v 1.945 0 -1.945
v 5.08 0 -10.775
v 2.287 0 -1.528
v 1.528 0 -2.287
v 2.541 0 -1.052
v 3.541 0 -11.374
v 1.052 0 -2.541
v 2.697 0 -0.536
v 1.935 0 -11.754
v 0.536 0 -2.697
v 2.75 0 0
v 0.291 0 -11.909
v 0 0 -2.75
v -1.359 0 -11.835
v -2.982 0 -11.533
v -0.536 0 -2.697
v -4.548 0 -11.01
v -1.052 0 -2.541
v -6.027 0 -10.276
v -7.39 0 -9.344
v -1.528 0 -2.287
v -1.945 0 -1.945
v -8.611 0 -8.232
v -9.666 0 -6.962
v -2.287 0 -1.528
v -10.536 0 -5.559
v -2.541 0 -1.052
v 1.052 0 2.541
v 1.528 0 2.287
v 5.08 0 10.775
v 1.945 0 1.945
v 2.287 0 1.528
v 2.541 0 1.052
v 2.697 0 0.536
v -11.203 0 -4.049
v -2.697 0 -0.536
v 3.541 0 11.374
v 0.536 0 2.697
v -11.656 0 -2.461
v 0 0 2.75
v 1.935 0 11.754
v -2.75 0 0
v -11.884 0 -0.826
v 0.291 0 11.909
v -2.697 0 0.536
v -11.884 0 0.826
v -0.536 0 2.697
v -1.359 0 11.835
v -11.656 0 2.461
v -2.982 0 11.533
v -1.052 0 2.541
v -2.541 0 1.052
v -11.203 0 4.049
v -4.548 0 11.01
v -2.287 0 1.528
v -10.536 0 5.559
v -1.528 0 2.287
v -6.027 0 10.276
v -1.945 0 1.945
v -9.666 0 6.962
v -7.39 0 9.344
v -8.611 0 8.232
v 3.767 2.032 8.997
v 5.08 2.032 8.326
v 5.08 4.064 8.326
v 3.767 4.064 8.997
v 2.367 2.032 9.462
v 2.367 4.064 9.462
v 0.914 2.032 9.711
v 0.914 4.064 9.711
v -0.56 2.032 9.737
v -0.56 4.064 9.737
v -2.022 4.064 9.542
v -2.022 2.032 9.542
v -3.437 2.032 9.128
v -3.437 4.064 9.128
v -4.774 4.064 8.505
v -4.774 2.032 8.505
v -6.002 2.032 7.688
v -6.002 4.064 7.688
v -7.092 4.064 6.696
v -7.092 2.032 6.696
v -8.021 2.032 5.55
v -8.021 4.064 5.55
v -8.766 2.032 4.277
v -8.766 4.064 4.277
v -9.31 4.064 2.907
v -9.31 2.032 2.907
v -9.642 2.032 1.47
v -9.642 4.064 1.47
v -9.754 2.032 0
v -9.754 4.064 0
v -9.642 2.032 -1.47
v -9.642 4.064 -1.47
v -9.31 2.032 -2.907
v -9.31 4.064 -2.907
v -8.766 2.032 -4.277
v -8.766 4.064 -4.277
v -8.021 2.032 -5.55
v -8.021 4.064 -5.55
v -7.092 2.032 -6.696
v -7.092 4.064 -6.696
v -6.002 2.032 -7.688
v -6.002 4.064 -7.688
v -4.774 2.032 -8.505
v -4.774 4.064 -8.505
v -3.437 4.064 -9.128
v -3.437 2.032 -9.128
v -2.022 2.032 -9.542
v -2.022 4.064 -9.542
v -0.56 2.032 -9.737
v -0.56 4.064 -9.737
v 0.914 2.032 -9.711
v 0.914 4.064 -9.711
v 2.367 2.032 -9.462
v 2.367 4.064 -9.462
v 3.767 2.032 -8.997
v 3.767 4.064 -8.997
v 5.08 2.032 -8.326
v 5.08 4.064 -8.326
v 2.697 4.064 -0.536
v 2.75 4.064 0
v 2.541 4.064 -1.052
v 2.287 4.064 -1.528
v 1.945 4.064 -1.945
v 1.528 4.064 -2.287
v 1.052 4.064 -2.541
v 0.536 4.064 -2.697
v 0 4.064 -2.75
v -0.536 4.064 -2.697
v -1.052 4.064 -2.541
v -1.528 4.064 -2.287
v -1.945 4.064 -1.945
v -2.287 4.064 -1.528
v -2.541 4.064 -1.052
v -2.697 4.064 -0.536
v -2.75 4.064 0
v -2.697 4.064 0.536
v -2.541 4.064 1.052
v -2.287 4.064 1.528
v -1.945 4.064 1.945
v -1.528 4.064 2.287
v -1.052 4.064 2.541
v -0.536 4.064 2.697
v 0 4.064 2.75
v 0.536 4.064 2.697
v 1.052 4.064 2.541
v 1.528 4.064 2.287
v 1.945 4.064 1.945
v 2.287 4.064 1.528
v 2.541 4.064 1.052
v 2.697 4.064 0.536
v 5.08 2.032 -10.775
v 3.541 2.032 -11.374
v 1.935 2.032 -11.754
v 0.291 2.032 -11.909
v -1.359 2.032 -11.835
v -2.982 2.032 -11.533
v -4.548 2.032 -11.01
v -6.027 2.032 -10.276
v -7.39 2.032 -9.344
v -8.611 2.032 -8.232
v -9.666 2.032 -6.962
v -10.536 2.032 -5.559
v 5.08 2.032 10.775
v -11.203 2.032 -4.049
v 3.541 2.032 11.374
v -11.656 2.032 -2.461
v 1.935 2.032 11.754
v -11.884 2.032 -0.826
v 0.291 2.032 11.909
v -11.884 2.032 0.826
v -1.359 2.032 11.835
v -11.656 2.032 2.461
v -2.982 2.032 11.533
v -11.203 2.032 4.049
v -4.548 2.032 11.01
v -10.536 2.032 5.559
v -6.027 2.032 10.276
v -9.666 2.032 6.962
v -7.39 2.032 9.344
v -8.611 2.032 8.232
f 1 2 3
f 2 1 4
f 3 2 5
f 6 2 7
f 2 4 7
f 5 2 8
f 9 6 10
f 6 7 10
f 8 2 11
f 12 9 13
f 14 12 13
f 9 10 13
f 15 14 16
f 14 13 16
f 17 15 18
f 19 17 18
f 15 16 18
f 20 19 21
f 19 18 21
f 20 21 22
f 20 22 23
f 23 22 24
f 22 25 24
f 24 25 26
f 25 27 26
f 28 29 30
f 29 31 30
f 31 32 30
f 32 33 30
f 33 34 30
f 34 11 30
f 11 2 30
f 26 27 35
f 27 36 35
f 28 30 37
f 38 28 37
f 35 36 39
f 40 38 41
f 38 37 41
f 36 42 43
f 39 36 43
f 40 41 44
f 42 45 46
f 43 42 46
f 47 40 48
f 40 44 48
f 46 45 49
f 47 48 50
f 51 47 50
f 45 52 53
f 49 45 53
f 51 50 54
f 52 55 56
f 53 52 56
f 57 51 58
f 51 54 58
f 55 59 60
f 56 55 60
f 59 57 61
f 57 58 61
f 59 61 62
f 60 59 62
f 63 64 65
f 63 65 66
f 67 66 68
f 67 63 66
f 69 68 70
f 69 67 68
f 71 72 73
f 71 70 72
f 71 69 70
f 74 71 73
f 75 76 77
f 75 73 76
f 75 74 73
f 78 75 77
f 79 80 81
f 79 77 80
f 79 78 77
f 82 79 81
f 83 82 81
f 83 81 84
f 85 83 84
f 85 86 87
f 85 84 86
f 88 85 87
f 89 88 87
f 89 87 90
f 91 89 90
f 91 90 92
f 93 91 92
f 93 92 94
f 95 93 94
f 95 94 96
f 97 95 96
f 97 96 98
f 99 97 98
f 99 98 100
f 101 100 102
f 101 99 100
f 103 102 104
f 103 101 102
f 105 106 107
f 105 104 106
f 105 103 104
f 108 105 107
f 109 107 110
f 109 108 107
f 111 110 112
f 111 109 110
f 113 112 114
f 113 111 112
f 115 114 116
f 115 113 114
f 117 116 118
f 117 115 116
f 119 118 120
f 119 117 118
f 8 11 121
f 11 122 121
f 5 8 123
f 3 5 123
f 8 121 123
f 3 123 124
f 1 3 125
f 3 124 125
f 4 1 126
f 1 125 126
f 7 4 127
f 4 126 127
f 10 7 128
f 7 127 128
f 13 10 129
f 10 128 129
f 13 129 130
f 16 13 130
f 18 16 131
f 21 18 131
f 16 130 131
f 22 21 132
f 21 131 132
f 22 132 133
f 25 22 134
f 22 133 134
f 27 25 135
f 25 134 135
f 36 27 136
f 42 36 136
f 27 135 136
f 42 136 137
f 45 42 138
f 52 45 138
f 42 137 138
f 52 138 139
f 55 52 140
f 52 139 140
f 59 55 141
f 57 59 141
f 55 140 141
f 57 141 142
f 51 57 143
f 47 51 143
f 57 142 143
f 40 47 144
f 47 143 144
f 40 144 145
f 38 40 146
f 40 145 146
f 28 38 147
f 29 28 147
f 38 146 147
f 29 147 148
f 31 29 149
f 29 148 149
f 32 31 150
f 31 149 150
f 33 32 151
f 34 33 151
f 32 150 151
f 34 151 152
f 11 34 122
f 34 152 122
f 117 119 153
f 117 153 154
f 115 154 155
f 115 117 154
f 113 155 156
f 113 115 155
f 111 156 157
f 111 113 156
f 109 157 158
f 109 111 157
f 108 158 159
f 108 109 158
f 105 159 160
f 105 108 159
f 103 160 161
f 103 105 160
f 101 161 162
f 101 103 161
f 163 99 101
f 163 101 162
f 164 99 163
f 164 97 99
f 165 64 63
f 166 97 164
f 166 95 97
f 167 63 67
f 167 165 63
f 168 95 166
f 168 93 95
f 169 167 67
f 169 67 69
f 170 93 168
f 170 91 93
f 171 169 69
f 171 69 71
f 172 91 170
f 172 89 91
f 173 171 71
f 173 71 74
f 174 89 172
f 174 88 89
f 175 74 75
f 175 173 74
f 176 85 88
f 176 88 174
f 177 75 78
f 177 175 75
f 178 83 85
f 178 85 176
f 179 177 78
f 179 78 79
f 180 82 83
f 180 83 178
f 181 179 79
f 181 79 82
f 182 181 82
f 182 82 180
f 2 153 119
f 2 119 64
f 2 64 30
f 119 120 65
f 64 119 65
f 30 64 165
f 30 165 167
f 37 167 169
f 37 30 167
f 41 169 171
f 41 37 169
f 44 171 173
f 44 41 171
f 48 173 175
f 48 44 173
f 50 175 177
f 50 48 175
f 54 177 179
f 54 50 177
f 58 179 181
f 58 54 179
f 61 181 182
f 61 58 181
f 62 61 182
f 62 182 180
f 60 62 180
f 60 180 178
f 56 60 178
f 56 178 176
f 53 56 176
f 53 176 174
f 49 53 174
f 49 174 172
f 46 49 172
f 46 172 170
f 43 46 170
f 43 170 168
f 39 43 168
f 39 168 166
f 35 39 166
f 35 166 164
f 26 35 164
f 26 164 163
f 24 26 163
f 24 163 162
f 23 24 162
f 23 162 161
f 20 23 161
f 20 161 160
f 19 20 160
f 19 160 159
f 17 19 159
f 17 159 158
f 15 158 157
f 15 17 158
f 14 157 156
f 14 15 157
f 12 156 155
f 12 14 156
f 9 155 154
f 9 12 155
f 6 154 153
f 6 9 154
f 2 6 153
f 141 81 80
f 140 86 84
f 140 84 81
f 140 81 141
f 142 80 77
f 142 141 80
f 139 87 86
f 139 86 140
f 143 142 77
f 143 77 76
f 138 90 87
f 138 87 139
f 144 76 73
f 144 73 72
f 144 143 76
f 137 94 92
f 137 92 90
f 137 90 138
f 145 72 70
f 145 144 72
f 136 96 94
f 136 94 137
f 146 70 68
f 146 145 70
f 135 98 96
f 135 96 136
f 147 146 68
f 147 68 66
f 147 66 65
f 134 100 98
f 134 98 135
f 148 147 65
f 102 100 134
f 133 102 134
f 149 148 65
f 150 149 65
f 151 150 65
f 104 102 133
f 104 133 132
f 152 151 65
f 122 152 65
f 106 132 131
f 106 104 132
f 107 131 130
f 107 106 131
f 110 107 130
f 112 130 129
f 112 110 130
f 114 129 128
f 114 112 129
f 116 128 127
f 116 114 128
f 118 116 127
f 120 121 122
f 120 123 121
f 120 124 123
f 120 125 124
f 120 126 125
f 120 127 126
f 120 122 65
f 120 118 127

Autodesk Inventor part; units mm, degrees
ref_plane "YZ Plane" through (0, 0, 0) normal (1, 0, 0) x (0, 1, 0)
ref_plane "XZ Plane" through (0, 0, 0) normal (0, 1, 0) x (-1, 0, 0)
ref_plane "XY Plane" through (0, 0, 0) normal (0, 0, 1) x (1, 0, 0)
sketch "Sketch1" plane through (0, 0, 0) normal (0, 1, 0) x (-1, 0, 0)
  circle A0 centre (0, 0) radius 11.9126
  dimension "d0" = 23.8252
extrude "Extrusion1" add sketch "Sketch1" along normal blind 2.032
sketch "Sketch2" plane through (0, 2.032, 0) normal (0, 1, 0) x (1, 0, 0)
  circle A0 centre (0, 0) radius 9.7536
  dimension "d3" = 19.5072
extrude "Extrusion2" add sketch "Sketch2" along normal blind 2.032
sketch "Sketch3" plane through (0, 4.064, 0) normal (0, 1, 0) x (1, 0, 0)
  circle A0 centre (0, 0) radius 2.75
  dimension "d6" = 5.5
extrude "Extrusion3" cut sketch "Sketch3" against normal blind 4.064
sketch "Sketch4" plane through (0, 4.064, 0) normal (0, 1, 0) x (1, 0, 0)
  line L0 (17.8511, 14.0442) -> (5.08, 14.0442)
  line L1 (5.08, 14.0442) -> (5.08, -15.9032)
  line L2 (5.08, -15.9032) -> (17.8511, -15.9032)
  line L3 (17.8511, -15.9032) -> (17.8511, 14.0442)
  point P0 (0, 0)
  dimension "d9" = 5.08
extrude "Extrusion4" cut sketch "Sketch4" against normal blind 4.064
properties part number "Spring Clamp Large"
